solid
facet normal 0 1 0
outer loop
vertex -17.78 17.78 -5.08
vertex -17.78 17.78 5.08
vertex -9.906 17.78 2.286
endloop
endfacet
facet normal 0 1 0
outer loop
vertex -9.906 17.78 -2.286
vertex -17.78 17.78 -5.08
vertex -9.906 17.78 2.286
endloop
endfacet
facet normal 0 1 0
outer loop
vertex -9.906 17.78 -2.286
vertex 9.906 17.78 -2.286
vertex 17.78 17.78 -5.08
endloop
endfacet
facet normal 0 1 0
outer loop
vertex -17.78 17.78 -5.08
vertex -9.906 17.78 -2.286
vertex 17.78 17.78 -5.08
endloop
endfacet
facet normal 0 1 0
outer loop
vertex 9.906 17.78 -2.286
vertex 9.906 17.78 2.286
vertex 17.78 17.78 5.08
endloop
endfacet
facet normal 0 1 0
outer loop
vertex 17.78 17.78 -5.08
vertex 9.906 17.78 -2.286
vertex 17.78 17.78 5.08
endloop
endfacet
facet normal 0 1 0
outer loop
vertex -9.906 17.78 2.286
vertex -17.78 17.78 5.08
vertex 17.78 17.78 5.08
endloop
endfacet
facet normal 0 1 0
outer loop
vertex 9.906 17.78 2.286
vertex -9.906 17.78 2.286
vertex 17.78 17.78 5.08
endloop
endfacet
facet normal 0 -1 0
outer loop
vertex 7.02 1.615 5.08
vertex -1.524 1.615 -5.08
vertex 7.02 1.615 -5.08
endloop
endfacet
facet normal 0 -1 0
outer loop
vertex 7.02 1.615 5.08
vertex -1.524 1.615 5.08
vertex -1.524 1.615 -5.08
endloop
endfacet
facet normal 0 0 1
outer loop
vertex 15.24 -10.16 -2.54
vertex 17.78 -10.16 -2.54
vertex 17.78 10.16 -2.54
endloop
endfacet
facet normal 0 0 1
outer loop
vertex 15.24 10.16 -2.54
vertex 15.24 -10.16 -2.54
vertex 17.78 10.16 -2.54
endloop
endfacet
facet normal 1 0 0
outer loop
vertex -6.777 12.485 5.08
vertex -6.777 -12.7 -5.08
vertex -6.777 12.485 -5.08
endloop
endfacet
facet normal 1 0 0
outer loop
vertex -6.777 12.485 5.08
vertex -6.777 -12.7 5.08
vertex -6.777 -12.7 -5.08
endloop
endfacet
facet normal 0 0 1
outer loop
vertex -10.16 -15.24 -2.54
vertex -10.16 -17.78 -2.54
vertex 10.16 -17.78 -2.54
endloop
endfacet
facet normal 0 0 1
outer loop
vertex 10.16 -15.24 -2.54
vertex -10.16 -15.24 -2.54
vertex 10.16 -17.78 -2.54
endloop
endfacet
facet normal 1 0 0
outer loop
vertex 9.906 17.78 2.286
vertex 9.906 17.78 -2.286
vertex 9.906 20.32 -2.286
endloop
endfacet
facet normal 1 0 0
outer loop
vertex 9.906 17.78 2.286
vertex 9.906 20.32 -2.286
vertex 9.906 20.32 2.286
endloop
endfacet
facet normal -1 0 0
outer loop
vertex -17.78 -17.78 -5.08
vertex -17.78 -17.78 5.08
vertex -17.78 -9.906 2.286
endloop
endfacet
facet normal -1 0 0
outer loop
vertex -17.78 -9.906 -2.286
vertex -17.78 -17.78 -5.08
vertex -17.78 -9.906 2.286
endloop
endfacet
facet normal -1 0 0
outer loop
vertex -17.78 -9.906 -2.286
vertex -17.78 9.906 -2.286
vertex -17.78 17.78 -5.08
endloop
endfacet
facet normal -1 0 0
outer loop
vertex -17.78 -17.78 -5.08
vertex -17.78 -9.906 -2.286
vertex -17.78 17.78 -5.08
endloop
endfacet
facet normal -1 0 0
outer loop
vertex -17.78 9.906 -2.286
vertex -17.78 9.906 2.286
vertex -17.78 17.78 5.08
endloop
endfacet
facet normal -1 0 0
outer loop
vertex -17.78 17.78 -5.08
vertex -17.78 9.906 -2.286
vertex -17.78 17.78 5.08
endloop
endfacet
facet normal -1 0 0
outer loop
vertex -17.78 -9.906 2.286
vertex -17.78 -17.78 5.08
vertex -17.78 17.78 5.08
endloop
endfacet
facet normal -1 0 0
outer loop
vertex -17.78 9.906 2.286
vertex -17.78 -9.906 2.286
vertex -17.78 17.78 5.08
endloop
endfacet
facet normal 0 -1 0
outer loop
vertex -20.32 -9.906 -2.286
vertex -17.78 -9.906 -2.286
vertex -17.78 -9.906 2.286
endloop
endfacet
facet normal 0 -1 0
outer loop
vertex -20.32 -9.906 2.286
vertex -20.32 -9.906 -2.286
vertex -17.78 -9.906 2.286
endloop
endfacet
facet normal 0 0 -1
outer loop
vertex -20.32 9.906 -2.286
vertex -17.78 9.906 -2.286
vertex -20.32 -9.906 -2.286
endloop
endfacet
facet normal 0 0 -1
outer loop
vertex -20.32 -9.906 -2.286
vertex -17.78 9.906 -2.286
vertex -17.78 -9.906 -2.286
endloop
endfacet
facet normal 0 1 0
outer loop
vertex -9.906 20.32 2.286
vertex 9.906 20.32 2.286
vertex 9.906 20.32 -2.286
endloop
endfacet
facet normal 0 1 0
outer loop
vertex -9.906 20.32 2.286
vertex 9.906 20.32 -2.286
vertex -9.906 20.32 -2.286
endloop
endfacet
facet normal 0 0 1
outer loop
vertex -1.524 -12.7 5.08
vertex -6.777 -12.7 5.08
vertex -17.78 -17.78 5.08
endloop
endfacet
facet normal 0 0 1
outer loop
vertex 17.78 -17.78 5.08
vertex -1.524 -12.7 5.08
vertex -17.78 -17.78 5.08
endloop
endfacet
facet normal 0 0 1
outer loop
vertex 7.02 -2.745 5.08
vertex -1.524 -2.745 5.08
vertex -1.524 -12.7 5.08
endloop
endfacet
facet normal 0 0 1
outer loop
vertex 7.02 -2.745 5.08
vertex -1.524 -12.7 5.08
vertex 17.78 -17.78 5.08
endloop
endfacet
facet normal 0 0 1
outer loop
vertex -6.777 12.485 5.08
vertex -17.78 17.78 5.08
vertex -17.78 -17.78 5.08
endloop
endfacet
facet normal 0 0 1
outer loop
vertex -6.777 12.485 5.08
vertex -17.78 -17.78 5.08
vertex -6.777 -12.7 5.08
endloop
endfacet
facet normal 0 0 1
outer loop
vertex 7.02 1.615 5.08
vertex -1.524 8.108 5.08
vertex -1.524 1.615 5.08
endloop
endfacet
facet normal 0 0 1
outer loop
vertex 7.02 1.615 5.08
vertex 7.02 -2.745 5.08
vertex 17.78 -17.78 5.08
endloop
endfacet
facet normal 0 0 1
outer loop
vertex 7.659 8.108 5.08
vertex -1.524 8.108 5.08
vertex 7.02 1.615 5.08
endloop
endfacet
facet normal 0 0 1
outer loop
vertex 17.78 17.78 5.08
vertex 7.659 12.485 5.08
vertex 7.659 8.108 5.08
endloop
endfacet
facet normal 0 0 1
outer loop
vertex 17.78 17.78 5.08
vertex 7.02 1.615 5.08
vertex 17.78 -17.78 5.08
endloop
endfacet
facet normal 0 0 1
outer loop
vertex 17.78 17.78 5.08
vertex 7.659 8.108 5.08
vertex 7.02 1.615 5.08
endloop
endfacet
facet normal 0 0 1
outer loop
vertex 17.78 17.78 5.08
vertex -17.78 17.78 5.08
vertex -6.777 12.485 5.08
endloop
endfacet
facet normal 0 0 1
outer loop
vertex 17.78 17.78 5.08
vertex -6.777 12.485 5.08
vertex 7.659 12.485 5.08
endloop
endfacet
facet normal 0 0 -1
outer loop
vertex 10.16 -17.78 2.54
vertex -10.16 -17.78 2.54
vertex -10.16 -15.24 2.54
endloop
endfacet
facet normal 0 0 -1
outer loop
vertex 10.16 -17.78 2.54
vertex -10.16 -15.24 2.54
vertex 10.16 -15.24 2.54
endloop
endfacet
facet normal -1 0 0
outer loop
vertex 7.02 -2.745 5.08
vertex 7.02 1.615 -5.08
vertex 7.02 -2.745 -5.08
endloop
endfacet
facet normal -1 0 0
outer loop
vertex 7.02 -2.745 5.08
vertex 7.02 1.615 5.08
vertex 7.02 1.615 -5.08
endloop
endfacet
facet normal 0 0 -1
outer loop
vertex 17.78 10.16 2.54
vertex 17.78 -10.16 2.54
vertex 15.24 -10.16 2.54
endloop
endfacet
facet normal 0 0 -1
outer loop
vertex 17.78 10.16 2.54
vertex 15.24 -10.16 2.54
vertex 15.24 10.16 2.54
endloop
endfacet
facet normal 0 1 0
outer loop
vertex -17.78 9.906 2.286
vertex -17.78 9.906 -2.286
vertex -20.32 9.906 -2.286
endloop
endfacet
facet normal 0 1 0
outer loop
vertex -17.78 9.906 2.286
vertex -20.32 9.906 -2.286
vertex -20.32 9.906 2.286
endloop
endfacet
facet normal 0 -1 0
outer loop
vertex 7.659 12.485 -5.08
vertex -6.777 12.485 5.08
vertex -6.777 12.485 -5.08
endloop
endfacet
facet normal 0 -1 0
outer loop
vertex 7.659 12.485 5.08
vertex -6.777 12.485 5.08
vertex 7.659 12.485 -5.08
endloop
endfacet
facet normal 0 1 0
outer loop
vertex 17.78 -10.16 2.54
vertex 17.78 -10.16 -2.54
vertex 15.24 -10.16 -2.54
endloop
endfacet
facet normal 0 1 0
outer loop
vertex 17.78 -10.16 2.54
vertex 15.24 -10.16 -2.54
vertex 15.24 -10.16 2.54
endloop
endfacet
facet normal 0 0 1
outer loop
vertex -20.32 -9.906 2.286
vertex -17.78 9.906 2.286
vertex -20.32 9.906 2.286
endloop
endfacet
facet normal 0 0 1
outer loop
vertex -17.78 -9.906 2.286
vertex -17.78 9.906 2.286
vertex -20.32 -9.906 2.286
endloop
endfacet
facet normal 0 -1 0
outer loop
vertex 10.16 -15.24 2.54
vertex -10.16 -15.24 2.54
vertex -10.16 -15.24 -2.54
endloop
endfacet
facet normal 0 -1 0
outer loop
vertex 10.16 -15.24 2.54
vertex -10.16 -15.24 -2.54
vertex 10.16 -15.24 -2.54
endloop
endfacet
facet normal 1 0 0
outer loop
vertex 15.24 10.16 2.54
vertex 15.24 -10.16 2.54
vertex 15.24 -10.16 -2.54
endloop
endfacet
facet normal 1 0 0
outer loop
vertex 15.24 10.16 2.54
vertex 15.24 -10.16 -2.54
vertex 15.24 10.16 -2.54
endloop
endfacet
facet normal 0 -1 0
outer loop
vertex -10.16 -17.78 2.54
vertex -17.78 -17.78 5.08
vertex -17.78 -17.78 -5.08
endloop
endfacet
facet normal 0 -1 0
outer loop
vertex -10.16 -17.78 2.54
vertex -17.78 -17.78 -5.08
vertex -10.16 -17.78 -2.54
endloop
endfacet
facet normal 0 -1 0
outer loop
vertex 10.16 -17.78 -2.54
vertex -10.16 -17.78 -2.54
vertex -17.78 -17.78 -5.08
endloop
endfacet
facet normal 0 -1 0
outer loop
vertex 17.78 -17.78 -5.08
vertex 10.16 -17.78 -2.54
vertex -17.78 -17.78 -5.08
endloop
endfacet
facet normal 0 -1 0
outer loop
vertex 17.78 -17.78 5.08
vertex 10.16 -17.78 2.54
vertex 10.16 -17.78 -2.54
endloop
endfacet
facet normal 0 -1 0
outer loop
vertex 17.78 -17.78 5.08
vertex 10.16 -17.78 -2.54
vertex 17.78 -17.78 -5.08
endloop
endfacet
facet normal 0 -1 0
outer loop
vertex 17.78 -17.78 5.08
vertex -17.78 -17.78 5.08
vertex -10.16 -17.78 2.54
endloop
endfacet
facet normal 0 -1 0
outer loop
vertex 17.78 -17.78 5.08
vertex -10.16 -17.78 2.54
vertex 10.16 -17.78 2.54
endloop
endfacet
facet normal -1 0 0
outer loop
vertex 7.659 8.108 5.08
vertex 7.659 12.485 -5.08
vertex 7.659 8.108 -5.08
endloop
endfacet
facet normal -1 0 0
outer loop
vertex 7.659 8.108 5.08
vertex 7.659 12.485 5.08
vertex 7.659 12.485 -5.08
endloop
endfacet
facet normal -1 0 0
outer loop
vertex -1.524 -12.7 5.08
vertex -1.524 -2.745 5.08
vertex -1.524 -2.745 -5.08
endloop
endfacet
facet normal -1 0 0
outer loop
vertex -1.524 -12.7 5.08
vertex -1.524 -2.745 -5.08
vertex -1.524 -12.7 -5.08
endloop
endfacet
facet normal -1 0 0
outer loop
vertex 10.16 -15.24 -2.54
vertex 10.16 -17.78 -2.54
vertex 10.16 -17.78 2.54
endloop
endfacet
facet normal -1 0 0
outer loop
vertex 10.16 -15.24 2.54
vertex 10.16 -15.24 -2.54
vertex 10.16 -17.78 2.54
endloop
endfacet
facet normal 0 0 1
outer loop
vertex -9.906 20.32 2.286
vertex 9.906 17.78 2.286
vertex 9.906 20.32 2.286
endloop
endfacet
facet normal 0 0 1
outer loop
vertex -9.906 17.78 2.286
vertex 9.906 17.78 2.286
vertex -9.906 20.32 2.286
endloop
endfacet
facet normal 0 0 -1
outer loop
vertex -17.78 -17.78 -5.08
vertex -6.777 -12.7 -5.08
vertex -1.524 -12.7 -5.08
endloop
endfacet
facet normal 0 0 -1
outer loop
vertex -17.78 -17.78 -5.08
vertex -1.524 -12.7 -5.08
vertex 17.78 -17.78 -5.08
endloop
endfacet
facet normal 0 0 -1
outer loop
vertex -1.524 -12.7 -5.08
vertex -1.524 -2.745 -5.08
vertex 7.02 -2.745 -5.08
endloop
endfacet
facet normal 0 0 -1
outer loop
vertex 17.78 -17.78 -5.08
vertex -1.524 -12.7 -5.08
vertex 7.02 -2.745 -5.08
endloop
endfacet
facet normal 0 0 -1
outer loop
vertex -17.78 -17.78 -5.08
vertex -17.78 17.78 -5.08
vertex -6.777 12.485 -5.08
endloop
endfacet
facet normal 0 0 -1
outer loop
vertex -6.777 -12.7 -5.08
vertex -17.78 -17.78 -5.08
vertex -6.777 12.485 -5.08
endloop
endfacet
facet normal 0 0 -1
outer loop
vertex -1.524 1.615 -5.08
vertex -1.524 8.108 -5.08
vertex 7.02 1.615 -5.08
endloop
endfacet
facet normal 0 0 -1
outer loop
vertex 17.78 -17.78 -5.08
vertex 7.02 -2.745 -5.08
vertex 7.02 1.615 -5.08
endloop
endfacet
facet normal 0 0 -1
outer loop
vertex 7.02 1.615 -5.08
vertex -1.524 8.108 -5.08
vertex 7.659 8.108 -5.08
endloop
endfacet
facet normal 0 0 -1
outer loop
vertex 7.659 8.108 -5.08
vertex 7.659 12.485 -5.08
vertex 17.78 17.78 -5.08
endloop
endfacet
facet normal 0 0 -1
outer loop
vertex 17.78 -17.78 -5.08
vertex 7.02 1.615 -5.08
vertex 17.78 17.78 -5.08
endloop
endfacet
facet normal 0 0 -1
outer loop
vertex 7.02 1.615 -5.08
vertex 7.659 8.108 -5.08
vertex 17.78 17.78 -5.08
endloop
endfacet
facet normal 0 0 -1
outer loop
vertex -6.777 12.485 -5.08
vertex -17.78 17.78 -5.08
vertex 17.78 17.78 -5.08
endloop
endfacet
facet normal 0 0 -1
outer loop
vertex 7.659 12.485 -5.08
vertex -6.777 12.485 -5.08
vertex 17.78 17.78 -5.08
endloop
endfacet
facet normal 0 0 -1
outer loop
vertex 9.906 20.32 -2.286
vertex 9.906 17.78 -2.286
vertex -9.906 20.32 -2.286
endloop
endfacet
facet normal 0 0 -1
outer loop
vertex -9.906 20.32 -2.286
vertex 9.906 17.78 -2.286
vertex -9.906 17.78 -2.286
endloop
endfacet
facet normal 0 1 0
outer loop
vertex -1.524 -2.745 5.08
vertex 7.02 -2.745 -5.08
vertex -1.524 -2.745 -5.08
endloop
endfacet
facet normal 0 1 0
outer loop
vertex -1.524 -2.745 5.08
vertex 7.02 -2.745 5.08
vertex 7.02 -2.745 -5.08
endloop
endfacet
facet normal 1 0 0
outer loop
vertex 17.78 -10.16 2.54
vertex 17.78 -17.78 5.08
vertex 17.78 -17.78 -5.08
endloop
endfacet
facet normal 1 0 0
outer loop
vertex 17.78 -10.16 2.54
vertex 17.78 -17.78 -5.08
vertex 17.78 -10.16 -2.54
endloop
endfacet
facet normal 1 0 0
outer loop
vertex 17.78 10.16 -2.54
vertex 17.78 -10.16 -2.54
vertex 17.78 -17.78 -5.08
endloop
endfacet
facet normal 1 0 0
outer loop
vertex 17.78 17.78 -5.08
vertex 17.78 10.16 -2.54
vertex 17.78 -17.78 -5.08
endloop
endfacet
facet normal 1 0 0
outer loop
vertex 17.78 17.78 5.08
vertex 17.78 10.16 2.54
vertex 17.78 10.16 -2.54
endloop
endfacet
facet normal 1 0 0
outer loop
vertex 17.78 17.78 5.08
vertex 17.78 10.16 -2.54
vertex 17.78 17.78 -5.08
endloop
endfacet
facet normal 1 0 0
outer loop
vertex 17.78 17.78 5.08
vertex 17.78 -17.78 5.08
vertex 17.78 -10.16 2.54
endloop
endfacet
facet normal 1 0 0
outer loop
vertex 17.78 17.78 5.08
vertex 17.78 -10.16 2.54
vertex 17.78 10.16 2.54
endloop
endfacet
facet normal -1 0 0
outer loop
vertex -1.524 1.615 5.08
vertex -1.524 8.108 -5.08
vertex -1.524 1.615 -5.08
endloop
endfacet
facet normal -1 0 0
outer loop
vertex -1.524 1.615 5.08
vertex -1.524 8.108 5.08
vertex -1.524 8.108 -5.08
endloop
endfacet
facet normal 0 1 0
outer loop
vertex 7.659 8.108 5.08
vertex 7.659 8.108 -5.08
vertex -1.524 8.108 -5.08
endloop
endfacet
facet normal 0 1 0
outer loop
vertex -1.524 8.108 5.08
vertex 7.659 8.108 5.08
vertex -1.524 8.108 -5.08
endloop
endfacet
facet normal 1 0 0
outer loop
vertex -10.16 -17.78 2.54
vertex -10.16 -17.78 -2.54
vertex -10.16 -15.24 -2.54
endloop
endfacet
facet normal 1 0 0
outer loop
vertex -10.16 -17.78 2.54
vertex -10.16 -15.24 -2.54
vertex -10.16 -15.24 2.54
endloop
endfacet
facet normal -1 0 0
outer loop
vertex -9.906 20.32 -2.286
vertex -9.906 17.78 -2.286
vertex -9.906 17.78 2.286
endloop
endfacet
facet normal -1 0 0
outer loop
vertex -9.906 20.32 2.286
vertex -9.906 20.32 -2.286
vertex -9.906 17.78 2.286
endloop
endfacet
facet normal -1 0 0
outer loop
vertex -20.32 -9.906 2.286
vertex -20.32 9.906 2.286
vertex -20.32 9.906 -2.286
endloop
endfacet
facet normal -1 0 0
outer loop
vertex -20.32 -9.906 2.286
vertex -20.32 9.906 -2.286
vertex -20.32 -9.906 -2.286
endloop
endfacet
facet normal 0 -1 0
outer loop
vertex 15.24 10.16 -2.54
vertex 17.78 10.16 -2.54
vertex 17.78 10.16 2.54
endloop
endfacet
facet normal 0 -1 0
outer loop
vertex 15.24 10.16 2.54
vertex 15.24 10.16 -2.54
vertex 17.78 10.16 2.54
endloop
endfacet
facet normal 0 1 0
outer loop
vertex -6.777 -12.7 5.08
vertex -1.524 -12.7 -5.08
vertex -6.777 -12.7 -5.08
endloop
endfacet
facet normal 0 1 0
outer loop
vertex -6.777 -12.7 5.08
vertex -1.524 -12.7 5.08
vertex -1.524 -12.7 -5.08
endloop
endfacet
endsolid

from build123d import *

# Parameters (mm, degrees)
F0_W     = 35.56
F0_H     = 35.56
F1_DEPTH = 5.08
F2_W     = 19.812
F2_H     = 4.572
F3_DEPTH = 2.54
F4_W     = 19.812
F4_H     = 4.572
F5_DEPTH = 2.54
F6_W     = 20.32
F6_H     = 5.08
F7_DEPTH = 2.54
F8_W     = 20.32
F8_H     = 5.08
F9_DEPTH = 2.54


with BuildPart() as f1:
    # F0 (on Top) → F1 (new body, symmetric)
    with BuildSketch(Plane.XY):
        Rectangle(F0_W, F0_H)
        Polygon((-1.5241102431, -2.7450520833), (-1.5241102431, -12.7), (-6.7771918403, -12.7), (-6.7771918403, 12.4850260417), (7.6591362847, 12.4850260417), (7.6591362847, 8.1083767361), (-1.5241102431, 8.1083767361), (-1.5241102431, 1.6150607639), (7.0197265625, 1.6150607639), (7.0197265625, -2.7450520833), align=None, mode=Mode.SUBTRACT)
    extrude(amount=F1_DEPTH, both=True)

    # F2 (on face) → F3 (join)
    with BuildSketch(Plane(origin=(0, 17.78, 0), x_dir=(-1, 0, 0), z_dir=(0, 1, 0))):
        Rectangle(F2_W, F2_H)
    extrude(amount=F3_DEPTH)

    # F4 (on face) → F5 (join)
    with BuildSketch(Plane(origin=(-17.78, 0, 0), x_dir=(0, -1, 0), z_dir=(-1, 0, 0))):
        Rectangle(F4_W, F4_H)
    extrude(amount=F5_DEPTH)

    # F6 (on face) → F7 (cut)
    with BuildSketch(Plane.XZ.offset(17.78)):
        Rectangle(F6_W, F6_H)
    extrude(amount=-F7_DEPTH, mode=Mode.SUBTRACT)

    # F8 (on face) → F9 (cut)
    with BuildSketch(Plane.YZ.offset(17.78)):
        Rectangle(F8_W, F8_H)
    extrude(amount=-F9_DEPTH, mode=Mode.SUBTRACT)


solid = f1.part
